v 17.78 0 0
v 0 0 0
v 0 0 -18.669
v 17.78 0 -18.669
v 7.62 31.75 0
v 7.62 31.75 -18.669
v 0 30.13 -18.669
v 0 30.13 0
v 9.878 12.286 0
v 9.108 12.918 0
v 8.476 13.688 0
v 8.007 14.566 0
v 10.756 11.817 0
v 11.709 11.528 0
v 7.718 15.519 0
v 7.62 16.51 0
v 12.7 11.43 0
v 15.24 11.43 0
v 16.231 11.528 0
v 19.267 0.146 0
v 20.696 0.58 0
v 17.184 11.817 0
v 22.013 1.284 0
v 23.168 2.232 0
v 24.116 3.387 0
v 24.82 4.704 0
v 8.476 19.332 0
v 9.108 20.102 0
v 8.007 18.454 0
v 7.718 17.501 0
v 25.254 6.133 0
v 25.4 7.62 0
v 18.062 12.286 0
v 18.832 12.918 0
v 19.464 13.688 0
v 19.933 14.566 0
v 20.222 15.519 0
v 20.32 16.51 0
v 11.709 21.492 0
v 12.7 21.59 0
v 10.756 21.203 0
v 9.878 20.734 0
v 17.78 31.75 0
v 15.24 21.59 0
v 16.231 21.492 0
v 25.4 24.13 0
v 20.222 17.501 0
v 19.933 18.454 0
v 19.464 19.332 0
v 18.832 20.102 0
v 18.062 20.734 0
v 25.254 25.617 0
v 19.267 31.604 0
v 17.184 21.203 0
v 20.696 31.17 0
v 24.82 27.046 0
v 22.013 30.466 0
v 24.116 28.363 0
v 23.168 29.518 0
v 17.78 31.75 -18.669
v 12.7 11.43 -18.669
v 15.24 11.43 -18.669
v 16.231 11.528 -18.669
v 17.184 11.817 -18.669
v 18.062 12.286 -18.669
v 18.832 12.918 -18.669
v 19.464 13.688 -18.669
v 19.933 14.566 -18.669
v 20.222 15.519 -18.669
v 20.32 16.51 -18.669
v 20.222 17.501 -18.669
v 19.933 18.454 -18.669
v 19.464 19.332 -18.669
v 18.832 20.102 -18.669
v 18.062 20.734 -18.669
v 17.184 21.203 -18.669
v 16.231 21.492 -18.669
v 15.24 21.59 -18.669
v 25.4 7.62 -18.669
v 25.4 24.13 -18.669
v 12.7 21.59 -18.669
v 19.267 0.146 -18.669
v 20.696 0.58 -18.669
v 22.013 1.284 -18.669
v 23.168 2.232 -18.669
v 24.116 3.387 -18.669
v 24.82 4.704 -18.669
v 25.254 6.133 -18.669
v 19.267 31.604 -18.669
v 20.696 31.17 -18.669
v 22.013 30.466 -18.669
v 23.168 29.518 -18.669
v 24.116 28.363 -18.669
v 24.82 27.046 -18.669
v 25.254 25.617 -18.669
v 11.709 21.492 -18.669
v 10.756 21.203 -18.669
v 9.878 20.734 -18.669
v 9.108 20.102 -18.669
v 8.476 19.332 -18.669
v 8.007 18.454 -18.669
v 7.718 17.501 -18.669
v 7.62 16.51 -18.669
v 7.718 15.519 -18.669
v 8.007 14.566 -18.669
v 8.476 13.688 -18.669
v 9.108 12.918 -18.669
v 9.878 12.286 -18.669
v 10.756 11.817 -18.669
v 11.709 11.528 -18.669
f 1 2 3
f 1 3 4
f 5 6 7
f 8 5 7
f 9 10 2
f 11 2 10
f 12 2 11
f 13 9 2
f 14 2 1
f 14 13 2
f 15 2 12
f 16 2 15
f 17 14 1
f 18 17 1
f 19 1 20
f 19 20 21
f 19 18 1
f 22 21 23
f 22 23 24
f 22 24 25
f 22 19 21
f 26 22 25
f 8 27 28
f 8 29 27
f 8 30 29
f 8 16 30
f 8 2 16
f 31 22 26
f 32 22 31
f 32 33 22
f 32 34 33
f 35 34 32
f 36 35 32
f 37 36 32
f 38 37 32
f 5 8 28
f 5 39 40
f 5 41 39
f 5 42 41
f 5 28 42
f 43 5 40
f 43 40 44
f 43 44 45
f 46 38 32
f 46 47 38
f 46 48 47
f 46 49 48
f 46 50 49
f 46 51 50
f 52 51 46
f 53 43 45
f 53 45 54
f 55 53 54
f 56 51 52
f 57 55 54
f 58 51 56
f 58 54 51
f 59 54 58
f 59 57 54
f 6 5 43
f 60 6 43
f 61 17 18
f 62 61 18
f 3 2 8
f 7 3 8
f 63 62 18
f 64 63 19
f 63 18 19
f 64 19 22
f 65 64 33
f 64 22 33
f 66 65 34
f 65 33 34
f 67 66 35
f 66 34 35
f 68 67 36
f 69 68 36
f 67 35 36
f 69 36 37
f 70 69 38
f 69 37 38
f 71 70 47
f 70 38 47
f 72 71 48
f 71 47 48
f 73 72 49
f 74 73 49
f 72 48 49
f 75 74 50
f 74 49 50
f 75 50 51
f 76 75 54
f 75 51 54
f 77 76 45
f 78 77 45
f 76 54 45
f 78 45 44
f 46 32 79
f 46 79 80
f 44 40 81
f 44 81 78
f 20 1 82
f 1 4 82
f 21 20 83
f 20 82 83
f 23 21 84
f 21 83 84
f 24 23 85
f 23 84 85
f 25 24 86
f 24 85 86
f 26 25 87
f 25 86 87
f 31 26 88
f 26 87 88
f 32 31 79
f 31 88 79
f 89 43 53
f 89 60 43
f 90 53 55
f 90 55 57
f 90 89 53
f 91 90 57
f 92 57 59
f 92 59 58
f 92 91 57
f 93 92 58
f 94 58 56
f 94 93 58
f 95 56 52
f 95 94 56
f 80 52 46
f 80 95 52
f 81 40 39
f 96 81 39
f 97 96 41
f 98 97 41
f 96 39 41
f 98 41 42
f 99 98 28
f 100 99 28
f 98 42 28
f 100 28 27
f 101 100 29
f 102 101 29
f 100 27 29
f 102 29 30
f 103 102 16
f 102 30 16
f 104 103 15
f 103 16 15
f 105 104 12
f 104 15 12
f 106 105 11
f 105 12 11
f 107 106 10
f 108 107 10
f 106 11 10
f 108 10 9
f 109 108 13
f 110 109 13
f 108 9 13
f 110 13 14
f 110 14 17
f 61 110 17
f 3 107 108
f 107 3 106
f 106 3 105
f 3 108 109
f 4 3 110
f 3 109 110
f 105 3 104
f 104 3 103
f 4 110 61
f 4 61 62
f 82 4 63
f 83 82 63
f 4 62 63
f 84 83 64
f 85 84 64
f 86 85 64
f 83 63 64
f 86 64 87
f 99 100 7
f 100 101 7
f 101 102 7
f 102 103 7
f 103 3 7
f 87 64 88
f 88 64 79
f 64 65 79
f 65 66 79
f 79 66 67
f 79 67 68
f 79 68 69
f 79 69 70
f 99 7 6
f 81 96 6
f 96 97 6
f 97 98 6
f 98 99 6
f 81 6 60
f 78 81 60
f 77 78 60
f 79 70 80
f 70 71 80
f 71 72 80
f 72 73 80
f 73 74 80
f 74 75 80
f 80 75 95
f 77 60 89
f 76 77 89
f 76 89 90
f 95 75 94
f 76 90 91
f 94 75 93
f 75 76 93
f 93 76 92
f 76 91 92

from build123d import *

# Parameters (mm, degrees)
SKETCH_W        = 25.4
SKETCH_H        = 31.75
PAD_DEPTH       = 18.669
POCKET_DEPTH    = 18.67
FILLET_R        = 7.62
POCKET001_DEPTH = 18.67


with BuildPart() as part:
    # Sketch → Pad (new body)
    with BuildSketch(Plane.XY):
        with Locations((12.7, 15.875)):
            Rectangle(SKETCH_W, SKETCH_H)
    extrude(amount=-PAD_DEPTH)

    # Sketch001 (on Face5 of Pad) → Pocket (cut, through all)
    with BuildSketch(Plane.XY):
        Polygon((7.62, 31.75), (0, 30.130319), (0, 31.75), align=None)
    extrude(amount=-POCKET_DEPTH, mode=Mode.SUBTRACT)

    # Fillet
    fillet_edges = [part.edges().sort_by_distance(p)[0] for p in [
        (25.4, 31.75, -9.3345),
        (25.4, 0, -9.3345),
    ]]
    fillet(fillet_edges, radius=FILLET_R)

    # Sketch002 (on Face2 of Fillet) → Pocket001 (cut, through all)
    with BuildSketch(Plane.XY):
        with BuildLine():
            ThreePointArc((12.7, 21.59), (7.62, 16.51), (12.7, 11.43))
            Line((12.7, 11.43), (15.24, 11.43))
            ThreePointArc((15.24, 11.43), (20.32, 16.51), (15.24, 21.59))
            Line((12.7, 21.59), (15.24, 21.59))
        make_face()
    extrude(amount=-POCKET001_DEPTH, mode=Mode.SUBTRACT)


solid = part.part
